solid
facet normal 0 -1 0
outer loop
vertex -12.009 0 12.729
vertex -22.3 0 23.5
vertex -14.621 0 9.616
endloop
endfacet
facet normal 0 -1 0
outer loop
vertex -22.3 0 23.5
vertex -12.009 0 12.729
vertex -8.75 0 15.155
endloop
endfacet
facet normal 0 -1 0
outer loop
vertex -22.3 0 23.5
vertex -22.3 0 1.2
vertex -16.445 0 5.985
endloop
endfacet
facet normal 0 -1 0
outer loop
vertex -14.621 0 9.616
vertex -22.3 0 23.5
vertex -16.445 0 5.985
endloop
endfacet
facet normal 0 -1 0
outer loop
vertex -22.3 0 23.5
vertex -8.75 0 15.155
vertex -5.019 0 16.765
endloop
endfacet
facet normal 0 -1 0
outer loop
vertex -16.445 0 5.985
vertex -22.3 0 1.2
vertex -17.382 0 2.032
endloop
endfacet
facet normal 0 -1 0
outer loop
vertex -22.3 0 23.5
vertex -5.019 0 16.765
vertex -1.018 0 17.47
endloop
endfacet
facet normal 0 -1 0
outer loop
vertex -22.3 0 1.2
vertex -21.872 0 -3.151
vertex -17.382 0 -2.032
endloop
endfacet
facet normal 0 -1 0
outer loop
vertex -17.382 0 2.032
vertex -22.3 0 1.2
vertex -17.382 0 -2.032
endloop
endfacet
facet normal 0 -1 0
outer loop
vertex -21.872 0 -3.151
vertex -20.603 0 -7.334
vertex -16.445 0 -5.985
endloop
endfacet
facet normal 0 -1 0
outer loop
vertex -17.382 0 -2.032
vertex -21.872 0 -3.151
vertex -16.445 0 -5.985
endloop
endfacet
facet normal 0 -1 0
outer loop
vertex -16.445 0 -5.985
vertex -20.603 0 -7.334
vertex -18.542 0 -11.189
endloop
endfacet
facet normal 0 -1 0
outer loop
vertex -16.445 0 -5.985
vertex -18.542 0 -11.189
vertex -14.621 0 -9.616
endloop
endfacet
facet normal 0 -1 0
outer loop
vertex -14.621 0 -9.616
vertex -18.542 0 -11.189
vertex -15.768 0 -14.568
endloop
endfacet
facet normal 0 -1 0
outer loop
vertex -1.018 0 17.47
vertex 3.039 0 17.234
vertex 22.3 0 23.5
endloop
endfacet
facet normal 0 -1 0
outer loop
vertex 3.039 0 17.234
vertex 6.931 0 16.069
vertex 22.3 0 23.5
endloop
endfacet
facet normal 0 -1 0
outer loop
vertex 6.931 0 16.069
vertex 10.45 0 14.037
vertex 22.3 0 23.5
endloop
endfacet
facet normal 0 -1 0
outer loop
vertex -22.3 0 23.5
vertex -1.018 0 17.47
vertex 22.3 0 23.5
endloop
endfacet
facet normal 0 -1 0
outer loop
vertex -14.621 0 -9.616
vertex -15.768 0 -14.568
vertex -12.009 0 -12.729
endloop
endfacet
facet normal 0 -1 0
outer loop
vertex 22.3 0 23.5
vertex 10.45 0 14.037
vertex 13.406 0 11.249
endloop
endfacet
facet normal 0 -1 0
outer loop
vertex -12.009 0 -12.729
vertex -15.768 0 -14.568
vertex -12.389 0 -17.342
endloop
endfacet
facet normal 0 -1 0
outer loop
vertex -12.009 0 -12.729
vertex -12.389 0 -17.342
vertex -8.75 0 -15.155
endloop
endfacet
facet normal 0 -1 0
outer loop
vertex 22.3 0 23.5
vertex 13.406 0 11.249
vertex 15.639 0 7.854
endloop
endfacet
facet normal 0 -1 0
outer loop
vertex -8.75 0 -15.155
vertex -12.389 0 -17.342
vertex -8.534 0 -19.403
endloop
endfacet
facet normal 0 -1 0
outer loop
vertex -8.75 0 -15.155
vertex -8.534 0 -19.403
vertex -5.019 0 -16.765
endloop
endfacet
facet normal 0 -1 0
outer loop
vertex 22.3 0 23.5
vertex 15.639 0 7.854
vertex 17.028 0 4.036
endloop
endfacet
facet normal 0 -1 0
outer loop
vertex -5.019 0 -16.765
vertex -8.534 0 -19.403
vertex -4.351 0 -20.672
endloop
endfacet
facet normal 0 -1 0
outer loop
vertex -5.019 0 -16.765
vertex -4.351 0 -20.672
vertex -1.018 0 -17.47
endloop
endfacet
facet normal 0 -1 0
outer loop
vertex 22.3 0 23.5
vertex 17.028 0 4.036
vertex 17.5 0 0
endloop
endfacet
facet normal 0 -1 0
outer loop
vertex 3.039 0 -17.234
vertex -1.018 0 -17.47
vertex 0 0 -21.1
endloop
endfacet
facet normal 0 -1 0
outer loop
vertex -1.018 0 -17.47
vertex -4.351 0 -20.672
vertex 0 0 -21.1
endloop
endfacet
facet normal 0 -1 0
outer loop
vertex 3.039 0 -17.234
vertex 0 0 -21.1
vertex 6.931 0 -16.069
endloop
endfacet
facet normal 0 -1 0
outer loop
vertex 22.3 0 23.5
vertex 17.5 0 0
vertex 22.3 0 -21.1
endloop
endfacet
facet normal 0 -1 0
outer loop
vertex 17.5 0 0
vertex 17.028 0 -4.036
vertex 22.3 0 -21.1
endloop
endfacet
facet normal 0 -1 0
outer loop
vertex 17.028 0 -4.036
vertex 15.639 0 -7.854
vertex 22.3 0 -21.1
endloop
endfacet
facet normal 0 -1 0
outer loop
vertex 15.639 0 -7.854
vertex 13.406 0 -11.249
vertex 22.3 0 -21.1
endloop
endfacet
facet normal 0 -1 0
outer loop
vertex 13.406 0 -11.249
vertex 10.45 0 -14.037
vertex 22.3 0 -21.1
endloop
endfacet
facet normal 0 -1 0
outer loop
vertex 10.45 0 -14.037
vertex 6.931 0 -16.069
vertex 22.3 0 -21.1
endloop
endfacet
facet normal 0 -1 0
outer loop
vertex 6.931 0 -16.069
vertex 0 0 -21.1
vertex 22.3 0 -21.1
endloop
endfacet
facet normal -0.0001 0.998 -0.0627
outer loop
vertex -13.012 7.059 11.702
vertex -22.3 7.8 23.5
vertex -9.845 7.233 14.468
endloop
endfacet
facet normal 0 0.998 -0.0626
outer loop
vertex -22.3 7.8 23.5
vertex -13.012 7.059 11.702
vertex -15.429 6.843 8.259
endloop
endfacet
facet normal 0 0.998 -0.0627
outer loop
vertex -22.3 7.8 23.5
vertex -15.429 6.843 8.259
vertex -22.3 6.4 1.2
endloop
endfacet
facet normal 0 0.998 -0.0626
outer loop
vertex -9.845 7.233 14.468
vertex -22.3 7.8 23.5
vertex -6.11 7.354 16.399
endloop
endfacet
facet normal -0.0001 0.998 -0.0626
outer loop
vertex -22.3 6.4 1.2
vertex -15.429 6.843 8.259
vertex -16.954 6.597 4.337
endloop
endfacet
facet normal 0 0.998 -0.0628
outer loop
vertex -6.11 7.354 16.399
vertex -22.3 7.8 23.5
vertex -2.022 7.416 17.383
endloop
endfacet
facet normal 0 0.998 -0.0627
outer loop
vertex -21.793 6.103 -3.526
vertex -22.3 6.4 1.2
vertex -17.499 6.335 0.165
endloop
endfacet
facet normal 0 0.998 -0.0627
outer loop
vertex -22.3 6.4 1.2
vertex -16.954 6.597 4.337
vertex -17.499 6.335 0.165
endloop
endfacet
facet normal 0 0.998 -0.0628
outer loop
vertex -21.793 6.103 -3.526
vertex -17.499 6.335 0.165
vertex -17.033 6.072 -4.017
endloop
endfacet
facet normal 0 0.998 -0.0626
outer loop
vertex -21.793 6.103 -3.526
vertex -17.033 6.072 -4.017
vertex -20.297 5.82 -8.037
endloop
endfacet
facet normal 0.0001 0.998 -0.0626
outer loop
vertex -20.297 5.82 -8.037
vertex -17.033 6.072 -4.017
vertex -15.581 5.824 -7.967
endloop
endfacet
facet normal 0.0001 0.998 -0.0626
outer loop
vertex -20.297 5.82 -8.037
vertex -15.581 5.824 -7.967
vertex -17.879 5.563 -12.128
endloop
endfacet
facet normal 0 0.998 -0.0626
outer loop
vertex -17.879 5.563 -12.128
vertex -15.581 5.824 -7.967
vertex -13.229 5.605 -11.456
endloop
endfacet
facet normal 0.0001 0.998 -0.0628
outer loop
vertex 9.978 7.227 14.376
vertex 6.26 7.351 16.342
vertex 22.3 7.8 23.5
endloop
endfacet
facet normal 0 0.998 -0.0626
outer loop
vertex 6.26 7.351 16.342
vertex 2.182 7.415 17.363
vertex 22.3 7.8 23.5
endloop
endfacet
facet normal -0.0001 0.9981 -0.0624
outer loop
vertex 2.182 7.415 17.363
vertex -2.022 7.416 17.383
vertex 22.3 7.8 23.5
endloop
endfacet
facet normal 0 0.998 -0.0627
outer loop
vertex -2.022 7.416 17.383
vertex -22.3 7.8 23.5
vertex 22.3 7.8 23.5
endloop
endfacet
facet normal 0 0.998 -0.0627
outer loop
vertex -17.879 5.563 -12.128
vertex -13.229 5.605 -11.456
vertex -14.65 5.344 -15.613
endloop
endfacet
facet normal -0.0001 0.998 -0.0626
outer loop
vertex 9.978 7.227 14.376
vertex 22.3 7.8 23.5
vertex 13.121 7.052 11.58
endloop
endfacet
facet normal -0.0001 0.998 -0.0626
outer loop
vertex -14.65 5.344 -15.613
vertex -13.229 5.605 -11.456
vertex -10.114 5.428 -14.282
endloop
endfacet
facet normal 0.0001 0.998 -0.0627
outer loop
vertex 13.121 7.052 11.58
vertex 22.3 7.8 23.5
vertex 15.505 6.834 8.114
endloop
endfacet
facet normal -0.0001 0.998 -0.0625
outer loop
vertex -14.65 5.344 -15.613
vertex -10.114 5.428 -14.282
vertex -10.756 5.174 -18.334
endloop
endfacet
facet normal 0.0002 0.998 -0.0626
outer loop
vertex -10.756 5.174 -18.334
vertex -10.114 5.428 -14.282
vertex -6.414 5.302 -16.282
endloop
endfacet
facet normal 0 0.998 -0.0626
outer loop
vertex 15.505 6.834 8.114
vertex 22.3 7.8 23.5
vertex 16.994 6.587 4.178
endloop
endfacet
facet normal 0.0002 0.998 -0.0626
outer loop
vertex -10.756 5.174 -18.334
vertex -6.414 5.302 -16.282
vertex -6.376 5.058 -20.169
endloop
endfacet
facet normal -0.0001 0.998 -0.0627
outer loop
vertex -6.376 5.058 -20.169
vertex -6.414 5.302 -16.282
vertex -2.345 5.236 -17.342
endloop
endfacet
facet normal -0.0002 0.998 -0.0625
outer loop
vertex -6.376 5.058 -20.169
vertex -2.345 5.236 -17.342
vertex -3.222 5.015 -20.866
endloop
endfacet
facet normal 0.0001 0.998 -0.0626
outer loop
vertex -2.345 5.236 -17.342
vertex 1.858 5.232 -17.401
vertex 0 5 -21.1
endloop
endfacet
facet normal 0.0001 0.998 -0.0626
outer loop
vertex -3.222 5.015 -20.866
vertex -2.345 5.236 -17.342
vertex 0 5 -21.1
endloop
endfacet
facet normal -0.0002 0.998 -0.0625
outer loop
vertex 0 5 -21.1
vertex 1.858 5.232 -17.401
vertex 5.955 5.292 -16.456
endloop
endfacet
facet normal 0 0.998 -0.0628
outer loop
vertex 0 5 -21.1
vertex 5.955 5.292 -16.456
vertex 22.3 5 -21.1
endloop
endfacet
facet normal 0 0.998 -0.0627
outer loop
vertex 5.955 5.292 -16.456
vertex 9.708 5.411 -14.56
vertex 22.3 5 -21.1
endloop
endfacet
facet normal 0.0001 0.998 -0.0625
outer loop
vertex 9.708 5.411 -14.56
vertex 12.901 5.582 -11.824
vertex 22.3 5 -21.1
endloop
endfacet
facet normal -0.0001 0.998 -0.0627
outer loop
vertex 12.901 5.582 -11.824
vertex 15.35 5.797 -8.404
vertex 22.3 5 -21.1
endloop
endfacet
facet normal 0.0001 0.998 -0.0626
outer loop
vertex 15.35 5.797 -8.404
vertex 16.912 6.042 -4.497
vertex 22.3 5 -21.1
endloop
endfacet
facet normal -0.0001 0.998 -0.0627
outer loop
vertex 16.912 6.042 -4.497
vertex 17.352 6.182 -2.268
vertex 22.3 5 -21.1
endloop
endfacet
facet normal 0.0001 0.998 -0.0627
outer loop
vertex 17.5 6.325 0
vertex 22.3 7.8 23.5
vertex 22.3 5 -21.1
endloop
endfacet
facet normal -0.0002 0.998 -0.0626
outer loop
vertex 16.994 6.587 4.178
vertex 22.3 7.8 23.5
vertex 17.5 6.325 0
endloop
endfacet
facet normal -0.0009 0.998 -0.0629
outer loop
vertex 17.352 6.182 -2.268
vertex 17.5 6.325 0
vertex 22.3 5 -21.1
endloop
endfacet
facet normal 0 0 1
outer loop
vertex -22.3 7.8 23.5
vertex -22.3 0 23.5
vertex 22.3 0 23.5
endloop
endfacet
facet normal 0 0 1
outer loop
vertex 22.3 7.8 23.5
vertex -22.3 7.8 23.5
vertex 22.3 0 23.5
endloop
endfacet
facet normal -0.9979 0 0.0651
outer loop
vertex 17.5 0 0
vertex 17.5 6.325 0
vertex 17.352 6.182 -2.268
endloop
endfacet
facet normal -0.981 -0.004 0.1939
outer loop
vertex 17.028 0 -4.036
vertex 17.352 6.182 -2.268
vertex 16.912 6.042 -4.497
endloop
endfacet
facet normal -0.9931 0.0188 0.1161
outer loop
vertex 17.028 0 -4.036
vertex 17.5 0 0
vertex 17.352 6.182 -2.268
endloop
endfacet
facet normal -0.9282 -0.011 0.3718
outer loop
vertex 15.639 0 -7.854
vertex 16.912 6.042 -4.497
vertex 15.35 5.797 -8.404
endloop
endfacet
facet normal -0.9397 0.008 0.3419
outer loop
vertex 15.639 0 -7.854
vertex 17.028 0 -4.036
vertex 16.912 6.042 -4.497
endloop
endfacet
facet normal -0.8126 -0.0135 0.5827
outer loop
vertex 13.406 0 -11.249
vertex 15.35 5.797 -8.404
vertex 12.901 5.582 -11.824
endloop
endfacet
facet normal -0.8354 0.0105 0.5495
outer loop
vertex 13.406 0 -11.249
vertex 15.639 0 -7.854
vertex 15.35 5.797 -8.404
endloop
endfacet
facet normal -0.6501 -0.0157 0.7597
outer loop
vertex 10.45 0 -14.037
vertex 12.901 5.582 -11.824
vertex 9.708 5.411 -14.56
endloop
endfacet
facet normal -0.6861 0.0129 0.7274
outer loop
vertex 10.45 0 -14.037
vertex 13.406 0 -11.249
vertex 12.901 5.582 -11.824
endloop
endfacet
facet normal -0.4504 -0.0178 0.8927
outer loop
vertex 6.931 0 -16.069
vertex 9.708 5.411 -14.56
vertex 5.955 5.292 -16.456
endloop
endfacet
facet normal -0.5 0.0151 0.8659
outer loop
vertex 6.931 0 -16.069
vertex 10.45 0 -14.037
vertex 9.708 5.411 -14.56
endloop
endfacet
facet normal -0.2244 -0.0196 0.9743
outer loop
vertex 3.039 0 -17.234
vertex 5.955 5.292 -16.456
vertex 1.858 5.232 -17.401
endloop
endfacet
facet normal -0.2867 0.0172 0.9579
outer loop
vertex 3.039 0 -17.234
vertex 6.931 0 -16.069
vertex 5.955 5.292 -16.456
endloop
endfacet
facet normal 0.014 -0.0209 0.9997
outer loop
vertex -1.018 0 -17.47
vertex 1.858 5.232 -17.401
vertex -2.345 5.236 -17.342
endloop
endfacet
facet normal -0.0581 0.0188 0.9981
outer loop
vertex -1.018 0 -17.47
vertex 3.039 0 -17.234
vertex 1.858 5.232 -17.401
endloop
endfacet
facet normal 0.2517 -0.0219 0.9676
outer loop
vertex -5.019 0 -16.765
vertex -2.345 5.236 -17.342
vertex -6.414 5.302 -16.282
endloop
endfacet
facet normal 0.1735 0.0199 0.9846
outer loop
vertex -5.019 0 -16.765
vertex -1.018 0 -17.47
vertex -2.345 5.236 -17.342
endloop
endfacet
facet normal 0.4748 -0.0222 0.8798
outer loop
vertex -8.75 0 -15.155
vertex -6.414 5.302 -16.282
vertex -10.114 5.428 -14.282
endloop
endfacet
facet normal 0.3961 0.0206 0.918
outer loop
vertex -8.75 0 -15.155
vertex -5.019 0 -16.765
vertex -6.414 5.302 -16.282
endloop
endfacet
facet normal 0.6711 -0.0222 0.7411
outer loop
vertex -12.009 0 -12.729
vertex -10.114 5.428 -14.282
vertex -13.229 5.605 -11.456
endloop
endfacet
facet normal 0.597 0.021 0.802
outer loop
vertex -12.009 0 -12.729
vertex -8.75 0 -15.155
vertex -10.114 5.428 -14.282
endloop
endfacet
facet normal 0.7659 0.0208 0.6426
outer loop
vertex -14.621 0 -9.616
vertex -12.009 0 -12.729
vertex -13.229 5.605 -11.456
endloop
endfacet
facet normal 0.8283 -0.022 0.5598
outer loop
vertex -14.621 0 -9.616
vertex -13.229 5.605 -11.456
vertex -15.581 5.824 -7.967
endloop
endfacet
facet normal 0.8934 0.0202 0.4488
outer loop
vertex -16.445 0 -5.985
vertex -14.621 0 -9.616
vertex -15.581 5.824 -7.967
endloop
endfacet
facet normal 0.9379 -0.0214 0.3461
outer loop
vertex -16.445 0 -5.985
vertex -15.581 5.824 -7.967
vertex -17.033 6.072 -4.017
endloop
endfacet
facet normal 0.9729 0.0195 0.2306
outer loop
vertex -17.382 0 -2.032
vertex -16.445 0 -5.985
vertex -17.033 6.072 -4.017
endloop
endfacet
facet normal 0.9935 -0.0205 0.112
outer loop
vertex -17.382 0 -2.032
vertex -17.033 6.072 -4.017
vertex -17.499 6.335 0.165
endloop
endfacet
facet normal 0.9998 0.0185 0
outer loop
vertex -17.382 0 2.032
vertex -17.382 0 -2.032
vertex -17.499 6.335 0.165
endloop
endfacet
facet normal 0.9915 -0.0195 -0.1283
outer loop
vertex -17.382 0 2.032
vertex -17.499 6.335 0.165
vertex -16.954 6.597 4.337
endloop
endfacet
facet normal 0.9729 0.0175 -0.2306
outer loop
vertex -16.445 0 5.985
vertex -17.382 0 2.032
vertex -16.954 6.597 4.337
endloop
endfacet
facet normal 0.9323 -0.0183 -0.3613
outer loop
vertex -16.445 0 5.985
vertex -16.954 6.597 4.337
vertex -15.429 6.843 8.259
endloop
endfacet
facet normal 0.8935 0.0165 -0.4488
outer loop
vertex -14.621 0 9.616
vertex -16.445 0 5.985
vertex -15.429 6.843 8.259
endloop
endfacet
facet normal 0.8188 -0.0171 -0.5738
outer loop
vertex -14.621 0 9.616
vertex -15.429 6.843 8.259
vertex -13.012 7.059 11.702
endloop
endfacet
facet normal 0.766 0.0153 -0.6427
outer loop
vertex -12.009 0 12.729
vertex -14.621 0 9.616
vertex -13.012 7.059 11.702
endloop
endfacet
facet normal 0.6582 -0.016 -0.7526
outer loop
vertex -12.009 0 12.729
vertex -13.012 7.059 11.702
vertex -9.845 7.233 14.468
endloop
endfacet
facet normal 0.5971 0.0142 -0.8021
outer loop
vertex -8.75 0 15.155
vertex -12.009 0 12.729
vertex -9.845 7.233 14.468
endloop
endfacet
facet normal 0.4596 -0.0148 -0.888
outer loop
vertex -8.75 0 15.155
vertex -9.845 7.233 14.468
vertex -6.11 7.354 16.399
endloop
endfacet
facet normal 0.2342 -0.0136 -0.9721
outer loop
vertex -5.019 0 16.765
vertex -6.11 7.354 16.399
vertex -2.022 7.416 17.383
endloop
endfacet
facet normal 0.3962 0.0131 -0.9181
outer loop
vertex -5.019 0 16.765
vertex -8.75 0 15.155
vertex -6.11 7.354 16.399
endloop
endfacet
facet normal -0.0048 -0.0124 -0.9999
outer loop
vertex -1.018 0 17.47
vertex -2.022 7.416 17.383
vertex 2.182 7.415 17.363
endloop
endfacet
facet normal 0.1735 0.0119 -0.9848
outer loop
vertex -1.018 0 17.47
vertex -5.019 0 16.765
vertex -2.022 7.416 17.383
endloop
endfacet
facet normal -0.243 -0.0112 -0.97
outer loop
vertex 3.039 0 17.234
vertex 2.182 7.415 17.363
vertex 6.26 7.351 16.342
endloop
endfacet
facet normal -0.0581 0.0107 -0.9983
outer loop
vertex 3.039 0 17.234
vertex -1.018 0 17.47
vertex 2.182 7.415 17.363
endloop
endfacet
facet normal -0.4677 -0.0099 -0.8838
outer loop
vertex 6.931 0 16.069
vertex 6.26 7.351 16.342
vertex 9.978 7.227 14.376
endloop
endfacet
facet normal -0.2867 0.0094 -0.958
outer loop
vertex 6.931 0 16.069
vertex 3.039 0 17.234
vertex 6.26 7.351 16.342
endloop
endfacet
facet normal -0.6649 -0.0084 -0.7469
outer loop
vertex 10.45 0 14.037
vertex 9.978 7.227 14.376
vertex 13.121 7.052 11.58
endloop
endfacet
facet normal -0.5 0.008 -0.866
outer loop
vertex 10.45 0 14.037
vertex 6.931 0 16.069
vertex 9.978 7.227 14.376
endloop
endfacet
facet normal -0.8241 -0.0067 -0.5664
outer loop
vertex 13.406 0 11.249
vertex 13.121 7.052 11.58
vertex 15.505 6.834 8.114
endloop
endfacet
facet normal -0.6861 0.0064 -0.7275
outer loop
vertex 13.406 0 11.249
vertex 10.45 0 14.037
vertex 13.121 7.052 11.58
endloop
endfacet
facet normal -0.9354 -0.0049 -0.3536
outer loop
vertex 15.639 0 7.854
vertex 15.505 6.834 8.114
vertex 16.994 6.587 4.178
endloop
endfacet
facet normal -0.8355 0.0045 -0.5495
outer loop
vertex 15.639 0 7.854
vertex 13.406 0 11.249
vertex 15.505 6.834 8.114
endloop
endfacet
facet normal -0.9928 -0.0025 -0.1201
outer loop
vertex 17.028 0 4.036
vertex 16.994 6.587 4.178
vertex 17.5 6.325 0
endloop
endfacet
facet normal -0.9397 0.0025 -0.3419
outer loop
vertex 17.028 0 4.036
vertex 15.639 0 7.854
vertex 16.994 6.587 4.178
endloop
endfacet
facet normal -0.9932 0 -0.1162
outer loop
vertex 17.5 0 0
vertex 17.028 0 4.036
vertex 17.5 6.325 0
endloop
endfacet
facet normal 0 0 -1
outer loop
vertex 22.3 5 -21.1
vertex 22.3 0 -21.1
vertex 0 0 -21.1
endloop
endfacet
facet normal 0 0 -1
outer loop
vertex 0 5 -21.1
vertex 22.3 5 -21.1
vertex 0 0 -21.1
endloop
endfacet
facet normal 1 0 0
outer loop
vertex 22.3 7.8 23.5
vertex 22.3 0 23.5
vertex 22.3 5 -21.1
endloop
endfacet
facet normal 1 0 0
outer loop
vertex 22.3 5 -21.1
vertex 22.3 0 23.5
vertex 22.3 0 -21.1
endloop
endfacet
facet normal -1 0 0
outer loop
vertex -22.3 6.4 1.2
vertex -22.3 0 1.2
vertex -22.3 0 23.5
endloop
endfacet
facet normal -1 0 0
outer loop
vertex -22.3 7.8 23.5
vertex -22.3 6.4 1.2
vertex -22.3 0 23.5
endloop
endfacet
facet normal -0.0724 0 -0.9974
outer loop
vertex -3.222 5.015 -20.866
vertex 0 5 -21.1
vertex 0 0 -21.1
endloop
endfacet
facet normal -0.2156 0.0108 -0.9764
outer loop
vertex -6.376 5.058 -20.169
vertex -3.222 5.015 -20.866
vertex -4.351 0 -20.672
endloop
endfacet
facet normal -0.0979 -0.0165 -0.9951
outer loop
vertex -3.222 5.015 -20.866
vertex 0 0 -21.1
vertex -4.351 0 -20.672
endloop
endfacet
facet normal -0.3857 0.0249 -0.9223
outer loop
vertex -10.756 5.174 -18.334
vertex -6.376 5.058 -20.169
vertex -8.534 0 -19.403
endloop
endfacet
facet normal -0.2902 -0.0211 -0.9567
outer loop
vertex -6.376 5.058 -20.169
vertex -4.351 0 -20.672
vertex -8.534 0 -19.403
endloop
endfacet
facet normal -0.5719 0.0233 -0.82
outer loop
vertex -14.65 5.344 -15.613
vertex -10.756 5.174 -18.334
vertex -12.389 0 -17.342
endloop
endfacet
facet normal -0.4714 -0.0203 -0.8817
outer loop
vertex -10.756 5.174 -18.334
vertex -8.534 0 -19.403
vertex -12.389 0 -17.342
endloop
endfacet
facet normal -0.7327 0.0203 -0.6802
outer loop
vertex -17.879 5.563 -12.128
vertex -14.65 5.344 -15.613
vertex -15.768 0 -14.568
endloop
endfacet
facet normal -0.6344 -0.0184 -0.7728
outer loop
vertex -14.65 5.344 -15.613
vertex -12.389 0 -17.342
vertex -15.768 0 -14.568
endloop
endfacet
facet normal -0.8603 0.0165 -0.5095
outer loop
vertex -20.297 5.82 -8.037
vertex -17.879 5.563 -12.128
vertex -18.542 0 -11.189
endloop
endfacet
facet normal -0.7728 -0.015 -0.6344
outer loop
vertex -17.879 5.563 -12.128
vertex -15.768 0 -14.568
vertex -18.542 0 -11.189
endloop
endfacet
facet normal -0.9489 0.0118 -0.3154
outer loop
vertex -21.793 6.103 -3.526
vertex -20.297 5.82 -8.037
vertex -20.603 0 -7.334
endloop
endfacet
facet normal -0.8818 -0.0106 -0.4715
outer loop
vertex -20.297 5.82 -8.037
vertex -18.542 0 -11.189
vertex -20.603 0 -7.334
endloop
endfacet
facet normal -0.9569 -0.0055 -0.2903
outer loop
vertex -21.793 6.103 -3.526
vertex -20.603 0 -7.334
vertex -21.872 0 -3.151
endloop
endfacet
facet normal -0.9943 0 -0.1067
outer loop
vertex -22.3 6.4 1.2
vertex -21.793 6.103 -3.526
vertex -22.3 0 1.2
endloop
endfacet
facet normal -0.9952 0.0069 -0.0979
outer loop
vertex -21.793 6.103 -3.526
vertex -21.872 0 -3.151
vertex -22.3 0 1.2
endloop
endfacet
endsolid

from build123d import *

# Parameters (mm, degrees)
SKETCH1_R           = 17.5
BOSS_EXTRUDE1_DEPTH = 300
CUT_EXTRUDE1_DEPTH  = 150


with BuildPart() as part:
    # Sketch1 → Boss-Extrude1 (new body)
    with BuildSketch(Plane(origin=(0, 0, 0), x_dir=(1, 0, 0), z_dir=(0, 1, 0))):
        with BuildLine():
            Line((-22.3, -23.5), (22.3, -23.5))
            Line((22.3, -23.5), (22.3, 21.1))
            Line((22.3, 21.1), (0, 21.1))
            ThreePointArc((0, 21.1), (-15.76848122, 14.56848122), (-22.3, -1.2))
            Line((-22.3, -1.2), (-22.3, -23.5))
        make_face()
        Circle(SKETCH1_R, mode=Mode.SUBTRACT)
    extrude(amount=BOSS_EXTRUDE1_DEPTH)

    # Sketch2 → Cut-Extrude1 (cut, symmetric)
    with BuildSketch(Plane(origin=(0, 0, 0), x_dir=(0, 0, -1), z_dir=(1, 0, 0))):
        Polygon((-23.5, 7.8), (21.1, 5), (89.895743618, 5), (89.895743618, 331.939309381), (-23.5, 331.939309381), align=None)
    extrude(amount=CUT_EXTRUDE1_DEPTH, both=True, mode=Mode.SUBTRACT)


solid = part.part
